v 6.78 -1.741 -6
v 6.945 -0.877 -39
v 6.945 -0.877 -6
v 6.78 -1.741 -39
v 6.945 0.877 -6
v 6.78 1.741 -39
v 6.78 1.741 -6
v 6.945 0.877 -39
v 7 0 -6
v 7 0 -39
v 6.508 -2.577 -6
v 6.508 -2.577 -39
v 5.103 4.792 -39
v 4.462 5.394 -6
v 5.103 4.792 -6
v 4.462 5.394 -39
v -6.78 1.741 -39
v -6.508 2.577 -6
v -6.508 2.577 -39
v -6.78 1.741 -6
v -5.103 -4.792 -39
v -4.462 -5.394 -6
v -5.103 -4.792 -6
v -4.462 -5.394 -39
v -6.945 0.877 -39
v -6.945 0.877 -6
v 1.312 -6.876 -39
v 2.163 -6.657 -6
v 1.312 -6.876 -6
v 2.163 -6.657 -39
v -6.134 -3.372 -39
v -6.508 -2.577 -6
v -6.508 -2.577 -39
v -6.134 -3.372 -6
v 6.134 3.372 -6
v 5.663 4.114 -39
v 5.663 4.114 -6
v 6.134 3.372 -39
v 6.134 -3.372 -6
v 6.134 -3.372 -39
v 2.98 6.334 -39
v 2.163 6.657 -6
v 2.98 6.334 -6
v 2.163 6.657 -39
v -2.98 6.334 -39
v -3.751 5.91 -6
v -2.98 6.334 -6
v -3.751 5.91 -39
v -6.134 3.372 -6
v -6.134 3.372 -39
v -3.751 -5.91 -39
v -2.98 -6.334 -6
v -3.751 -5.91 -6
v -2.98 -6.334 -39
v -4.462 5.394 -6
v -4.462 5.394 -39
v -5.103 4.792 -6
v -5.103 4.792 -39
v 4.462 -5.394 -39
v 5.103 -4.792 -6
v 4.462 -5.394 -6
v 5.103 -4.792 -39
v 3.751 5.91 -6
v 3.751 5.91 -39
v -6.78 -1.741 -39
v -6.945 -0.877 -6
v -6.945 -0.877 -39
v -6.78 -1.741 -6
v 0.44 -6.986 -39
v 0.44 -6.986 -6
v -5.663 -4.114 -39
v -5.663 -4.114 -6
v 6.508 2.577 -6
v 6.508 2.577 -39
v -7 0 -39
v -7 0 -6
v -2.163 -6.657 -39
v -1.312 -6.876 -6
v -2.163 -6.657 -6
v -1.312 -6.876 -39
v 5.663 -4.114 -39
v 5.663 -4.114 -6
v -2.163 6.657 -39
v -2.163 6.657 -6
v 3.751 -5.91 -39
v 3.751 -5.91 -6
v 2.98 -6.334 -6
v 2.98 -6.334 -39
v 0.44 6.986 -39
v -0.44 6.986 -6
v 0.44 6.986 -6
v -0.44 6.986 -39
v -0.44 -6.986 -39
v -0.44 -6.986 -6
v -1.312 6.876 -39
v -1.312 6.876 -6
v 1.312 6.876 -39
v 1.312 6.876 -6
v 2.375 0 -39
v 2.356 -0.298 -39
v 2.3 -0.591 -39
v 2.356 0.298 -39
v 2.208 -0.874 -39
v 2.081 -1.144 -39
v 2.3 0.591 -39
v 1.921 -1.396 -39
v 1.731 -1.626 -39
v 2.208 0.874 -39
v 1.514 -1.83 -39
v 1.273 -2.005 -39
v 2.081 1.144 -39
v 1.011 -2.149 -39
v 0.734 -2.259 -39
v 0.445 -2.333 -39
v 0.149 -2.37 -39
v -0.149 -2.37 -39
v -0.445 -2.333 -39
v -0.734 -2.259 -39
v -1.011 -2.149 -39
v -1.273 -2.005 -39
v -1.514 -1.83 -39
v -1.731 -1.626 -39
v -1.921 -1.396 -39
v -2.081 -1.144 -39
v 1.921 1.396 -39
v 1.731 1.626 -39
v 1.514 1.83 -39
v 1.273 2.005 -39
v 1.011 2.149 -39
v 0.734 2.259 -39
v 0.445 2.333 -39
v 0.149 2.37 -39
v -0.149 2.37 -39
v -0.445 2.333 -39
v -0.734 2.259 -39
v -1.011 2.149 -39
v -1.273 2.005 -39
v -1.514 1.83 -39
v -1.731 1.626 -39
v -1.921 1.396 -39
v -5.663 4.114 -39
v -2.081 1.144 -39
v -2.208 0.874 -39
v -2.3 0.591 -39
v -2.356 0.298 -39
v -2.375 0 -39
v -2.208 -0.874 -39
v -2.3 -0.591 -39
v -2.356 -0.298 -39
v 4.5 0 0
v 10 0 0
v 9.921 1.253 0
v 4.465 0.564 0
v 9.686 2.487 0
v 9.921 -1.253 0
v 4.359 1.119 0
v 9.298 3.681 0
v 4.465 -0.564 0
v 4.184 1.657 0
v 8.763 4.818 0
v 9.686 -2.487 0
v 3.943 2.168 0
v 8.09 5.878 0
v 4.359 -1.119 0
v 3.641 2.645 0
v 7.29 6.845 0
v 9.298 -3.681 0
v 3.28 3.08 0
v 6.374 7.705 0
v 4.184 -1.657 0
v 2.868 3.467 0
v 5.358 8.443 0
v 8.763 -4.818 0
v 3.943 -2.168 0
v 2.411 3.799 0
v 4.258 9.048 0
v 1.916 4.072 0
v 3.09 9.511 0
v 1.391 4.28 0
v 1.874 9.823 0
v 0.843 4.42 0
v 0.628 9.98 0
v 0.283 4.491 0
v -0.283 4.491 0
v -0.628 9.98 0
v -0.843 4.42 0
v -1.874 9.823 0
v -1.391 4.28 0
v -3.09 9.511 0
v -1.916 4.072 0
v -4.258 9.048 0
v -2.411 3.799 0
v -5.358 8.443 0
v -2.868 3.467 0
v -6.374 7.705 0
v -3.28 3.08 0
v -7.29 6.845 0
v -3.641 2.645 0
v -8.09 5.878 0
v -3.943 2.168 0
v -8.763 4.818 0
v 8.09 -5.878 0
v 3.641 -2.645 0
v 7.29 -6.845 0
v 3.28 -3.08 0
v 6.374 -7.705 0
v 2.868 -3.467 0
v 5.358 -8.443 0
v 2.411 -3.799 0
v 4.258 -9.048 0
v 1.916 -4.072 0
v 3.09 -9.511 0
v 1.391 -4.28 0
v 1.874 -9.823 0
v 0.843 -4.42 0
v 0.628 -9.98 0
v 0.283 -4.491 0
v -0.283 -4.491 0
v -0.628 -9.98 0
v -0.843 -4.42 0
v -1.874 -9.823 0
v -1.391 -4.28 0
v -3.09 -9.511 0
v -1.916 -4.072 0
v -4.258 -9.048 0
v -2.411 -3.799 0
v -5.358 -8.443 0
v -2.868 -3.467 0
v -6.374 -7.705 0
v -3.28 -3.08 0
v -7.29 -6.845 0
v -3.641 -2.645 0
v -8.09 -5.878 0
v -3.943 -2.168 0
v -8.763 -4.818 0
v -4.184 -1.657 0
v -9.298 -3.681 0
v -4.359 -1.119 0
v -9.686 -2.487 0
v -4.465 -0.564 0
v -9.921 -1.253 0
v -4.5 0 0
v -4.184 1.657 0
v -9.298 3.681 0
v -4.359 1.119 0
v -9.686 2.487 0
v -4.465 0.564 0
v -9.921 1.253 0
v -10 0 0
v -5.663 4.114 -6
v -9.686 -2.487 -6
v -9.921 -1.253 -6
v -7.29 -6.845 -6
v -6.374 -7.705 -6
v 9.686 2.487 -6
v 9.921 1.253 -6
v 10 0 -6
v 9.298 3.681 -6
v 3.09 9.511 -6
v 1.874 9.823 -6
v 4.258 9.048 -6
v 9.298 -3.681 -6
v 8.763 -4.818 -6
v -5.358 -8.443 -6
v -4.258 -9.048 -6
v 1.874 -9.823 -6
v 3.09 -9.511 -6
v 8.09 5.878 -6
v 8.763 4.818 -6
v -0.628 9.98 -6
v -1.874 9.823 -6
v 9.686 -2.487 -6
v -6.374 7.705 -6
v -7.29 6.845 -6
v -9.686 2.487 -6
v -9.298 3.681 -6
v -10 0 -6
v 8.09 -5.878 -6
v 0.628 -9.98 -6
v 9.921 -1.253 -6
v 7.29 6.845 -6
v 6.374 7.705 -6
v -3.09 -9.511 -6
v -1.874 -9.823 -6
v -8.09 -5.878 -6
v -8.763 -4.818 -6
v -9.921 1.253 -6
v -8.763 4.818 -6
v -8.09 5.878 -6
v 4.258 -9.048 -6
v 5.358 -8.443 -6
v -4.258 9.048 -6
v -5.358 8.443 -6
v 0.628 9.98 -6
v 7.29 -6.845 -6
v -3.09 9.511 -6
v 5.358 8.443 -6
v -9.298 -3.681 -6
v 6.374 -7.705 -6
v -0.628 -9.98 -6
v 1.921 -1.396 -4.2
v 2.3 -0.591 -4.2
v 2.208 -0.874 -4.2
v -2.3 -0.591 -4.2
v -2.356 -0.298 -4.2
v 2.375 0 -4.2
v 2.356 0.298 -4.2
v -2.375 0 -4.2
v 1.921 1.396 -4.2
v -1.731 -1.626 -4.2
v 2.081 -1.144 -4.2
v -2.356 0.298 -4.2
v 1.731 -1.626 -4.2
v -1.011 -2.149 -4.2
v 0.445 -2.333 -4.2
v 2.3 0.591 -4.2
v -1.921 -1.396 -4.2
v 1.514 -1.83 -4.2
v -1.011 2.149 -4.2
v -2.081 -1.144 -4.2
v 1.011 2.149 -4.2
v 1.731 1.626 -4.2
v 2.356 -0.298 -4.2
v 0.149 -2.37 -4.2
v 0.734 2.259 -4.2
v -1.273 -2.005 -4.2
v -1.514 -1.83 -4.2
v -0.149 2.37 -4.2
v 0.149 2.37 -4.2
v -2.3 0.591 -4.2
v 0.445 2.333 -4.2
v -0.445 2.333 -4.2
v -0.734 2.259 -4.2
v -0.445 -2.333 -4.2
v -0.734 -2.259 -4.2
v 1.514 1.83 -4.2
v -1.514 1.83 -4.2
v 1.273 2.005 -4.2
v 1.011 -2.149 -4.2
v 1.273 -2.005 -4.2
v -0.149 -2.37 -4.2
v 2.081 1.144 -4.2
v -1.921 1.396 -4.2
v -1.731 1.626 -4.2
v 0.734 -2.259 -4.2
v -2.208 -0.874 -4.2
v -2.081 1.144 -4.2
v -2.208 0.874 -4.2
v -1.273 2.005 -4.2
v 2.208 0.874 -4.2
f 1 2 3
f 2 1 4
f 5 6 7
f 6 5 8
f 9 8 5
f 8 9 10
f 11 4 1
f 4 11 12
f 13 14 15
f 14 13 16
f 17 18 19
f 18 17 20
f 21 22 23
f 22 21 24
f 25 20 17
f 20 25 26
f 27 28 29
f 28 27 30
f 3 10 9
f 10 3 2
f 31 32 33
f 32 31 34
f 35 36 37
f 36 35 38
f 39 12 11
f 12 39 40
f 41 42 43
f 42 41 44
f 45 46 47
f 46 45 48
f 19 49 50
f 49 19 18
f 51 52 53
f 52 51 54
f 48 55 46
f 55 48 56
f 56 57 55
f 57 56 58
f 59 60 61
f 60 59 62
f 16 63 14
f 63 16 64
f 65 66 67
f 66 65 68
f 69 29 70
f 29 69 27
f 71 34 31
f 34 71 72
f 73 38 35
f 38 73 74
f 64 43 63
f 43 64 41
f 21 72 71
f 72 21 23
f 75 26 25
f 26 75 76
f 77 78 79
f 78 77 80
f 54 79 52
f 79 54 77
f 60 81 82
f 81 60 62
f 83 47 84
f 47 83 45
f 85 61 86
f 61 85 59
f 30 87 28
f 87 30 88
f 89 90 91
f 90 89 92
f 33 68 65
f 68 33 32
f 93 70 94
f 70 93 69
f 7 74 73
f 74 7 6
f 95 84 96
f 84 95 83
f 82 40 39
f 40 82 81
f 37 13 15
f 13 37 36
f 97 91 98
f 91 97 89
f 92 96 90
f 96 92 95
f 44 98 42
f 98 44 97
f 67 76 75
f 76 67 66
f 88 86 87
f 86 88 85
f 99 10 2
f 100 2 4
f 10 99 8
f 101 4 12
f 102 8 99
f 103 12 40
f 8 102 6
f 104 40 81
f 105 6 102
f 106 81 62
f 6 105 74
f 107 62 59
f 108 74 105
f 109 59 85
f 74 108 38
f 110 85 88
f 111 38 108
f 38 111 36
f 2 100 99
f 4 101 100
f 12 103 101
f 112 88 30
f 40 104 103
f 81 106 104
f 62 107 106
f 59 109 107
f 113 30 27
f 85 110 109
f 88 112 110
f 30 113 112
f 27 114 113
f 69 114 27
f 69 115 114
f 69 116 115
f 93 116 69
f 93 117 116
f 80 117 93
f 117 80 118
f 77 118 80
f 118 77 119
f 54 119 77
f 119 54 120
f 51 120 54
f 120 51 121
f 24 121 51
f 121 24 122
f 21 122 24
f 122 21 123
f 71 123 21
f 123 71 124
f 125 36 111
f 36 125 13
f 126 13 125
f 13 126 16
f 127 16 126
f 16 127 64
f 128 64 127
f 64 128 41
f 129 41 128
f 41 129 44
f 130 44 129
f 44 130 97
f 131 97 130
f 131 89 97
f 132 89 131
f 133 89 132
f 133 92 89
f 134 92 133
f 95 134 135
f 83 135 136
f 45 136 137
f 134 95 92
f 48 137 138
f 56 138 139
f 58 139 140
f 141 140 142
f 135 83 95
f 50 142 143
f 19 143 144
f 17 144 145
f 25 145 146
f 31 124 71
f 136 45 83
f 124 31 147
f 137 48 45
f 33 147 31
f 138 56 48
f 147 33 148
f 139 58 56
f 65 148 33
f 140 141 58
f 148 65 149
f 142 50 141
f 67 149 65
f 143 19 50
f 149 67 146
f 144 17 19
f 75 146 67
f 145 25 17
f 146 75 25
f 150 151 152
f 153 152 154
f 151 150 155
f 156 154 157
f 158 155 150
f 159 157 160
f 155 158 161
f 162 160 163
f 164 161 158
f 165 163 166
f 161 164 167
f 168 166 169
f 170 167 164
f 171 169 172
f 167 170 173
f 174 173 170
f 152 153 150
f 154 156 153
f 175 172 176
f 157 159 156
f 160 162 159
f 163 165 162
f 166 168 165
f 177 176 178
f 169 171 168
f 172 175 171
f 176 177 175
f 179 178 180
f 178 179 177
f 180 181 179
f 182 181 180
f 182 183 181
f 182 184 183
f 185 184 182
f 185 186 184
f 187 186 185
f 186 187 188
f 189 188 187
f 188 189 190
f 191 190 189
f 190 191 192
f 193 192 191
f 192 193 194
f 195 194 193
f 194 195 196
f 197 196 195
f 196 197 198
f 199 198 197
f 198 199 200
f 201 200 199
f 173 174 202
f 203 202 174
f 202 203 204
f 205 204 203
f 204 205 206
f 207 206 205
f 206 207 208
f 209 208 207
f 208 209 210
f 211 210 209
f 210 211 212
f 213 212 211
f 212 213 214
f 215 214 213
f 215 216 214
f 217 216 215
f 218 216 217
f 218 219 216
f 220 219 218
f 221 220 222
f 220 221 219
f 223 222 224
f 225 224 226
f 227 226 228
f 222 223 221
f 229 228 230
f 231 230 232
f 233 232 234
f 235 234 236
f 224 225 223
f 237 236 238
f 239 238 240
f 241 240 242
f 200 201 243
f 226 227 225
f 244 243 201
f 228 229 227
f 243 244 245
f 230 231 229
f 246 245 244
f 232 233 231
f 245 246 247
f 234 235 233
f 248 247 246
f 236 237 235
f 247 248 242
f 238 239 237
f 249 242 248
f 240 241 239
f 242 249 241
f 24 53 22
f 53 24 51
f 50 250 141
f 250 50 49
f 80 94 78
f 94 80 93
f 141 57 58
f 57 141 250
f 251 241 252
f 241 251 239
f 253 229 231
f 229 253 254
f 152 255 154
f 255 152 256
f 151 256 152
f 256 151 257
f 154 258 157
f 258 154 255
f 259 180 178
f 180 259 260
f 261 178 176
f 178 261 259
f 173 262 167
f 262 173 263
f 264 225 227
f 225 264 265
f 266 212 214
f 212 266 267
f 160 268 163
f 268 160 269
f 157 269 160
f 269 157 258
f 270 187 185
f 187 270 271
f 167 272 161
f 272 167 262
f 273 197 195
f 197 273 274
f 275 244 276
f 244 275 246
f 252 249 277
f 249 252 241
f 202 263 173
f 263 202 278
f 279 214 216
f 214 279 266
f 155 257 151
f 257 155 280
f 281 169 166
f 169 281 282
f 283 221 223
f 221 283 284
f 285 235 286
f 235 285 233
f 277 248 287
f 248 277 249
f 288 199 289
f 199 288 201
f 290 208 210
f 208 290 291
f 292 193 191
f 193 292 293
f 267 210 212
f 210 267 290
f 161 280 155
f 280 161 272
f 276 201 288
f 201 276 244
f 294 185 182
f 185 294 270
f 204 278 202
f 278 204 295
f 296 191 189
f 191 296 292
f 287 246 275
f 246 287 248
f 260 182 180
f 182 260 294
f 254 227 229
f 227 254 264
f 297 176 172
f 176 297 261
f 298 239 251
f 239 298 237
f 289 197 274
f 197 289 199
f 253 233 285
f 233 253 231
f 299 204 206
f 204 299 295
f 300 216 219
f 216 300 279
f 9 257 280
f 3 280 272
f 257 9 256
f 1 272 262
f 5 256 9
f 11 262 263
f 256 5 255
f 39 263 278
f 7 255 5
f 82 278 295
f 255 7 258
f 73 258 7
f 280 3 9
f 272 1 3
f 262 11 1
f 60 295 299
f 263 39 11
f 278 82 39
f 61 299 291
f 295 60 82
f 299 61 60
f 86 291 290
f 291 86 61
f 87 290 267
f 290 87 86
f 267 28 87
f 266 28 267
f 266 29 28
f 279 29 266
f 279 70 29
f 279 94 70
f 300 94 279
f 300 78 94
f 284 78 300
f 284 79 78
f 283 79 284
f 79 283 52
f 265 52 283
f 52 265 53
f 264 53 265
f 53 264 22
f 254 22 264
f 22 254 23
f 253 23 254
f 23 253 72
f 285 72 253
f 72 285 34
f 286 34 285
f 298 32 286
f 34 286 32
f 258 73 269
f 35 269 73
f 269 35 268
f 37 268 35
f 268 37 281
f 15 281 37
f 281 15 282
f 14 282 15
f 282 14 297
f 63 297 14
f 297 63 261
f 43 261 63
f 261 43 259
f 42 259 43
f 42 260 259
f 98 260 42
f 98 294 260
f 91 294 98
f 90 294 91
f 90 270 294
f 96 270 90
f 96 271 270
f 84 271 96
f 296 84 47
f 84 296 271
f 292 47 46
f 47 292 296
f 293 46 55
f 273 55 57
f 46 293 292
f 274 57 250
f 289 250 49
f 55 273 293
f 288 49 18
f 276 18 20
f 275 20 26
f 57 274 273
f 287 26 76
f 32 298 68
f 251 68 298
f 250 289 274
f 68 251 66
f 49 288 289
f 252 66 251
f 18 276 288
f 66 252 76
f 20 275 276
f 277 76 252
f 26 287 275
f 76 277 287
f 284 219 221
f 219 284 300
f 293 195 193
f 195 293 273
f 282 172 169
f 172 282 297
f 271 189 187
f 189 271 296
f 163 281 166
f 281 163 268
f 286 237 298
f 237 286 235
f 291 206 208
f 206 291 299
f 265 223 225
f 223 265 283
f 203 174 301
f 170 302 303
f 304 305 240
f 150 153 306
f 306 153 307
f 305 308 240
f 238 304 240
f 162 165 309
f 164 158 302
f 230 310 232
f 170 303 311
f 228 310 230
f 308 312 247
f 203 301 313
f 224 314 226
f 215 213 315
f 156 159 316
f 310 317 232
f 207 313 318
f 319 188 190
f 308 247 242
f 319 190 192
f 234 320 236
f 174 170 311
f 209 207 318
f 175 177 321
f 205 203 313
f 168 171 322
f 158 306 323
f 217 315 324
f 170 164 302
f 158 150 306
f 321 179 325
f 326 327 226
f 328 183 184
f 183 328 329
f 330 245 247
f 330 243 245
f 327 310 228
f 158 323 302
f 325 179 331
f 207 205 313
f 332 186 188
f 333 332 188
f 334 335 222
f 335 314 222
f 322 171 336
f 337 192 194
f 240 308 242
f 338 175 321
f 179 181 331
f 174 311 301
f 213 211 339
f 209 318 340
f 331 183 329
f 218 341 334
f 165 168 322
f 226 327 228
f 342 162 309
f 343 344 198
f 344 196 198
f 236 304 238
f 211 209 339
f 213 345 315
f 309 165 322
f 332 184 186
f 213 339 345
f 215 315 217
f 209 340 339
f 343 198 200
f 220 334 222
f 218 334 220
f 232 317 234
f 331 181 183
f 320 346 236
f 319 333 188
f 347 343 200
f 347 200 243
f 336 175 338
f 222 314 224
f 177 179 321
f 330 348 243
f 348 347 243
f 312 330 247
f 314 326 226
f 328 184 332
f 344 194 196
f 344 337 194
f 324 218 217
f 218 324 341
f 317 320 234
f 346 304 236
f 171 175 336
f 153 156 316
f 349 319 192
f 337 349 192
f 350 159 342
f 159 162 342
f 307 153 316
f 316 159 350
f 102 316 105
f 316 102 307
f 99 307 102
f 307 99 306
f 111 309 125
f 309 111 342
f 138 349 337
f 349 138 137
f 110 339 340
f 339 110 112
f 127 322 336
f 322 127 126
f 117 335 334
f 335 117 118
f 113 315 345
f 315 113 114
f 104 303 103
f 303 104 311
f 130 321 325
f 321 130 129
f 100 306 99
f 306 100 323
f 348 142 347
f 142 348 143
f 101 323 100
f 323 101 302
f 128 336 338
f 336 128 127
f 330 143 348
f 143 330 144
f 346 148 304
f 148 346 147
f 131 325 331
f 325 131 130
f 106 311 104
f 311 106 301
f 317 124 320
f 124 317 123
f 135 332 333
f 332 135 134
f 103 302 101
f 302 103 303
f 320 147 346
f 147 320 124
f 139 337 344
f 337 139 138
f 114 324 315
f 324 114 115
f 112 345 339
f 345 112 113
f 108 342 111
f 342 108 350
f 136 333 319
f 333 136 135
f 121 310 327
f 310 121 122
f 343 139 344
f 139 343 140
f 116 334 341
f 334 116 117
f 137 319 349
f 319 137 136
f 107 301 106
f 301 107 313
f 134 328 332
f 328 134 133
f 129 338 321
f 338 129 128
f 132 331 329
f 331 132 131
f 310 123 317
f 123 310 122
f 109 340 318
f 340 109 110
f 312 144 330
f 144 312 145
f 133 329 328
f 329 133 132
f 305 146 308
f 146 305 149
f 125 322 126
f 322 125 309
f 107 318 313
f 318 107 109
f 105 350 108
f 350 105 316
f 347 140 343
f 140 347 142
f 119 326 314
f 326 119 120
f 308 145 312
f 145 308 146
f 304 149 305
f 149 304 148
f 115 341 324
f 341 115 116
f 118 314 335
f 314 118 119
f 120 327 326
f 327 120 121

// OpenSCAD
$fn = 50;


difference() {
	union() {
		translate(v = [0, 0, -39.0000000000]) {
			cylinder(h = 39, r = 7.0000000000);
		}
		translate(v = [0, 0, -6.0000000000]) {
			cylinder(h = 6, r = 10.0000000000);
		}
	}
	union() {
		translate(v = [0, 0, 0]) {
			rotate(a = [0, 0, 0]) {
				difference() {
					union() {
						#translate(v = [0, 0, -39.0000000000]) {
							cylinder(h = 39, r = 2.2500000000);
						}
						#translate(v = [0, 0, -4.2000000000]) {
							cylinder(h = 4.2000000000, r = 7.0000000000, r1 = 2.3750000000, r2 = 4.5000000000);
						}
						#translate(v = [0, 0, -39.0000000000]) {
							cylinder(h = 39, r = 2.3750000000);
						}
						#translate(v = [0, 0, -39.0000000000]) {
							cylinder(h = 39, r = 2.2500000000);
						}
					}
					union();
				}
			}
		}
	}
}
